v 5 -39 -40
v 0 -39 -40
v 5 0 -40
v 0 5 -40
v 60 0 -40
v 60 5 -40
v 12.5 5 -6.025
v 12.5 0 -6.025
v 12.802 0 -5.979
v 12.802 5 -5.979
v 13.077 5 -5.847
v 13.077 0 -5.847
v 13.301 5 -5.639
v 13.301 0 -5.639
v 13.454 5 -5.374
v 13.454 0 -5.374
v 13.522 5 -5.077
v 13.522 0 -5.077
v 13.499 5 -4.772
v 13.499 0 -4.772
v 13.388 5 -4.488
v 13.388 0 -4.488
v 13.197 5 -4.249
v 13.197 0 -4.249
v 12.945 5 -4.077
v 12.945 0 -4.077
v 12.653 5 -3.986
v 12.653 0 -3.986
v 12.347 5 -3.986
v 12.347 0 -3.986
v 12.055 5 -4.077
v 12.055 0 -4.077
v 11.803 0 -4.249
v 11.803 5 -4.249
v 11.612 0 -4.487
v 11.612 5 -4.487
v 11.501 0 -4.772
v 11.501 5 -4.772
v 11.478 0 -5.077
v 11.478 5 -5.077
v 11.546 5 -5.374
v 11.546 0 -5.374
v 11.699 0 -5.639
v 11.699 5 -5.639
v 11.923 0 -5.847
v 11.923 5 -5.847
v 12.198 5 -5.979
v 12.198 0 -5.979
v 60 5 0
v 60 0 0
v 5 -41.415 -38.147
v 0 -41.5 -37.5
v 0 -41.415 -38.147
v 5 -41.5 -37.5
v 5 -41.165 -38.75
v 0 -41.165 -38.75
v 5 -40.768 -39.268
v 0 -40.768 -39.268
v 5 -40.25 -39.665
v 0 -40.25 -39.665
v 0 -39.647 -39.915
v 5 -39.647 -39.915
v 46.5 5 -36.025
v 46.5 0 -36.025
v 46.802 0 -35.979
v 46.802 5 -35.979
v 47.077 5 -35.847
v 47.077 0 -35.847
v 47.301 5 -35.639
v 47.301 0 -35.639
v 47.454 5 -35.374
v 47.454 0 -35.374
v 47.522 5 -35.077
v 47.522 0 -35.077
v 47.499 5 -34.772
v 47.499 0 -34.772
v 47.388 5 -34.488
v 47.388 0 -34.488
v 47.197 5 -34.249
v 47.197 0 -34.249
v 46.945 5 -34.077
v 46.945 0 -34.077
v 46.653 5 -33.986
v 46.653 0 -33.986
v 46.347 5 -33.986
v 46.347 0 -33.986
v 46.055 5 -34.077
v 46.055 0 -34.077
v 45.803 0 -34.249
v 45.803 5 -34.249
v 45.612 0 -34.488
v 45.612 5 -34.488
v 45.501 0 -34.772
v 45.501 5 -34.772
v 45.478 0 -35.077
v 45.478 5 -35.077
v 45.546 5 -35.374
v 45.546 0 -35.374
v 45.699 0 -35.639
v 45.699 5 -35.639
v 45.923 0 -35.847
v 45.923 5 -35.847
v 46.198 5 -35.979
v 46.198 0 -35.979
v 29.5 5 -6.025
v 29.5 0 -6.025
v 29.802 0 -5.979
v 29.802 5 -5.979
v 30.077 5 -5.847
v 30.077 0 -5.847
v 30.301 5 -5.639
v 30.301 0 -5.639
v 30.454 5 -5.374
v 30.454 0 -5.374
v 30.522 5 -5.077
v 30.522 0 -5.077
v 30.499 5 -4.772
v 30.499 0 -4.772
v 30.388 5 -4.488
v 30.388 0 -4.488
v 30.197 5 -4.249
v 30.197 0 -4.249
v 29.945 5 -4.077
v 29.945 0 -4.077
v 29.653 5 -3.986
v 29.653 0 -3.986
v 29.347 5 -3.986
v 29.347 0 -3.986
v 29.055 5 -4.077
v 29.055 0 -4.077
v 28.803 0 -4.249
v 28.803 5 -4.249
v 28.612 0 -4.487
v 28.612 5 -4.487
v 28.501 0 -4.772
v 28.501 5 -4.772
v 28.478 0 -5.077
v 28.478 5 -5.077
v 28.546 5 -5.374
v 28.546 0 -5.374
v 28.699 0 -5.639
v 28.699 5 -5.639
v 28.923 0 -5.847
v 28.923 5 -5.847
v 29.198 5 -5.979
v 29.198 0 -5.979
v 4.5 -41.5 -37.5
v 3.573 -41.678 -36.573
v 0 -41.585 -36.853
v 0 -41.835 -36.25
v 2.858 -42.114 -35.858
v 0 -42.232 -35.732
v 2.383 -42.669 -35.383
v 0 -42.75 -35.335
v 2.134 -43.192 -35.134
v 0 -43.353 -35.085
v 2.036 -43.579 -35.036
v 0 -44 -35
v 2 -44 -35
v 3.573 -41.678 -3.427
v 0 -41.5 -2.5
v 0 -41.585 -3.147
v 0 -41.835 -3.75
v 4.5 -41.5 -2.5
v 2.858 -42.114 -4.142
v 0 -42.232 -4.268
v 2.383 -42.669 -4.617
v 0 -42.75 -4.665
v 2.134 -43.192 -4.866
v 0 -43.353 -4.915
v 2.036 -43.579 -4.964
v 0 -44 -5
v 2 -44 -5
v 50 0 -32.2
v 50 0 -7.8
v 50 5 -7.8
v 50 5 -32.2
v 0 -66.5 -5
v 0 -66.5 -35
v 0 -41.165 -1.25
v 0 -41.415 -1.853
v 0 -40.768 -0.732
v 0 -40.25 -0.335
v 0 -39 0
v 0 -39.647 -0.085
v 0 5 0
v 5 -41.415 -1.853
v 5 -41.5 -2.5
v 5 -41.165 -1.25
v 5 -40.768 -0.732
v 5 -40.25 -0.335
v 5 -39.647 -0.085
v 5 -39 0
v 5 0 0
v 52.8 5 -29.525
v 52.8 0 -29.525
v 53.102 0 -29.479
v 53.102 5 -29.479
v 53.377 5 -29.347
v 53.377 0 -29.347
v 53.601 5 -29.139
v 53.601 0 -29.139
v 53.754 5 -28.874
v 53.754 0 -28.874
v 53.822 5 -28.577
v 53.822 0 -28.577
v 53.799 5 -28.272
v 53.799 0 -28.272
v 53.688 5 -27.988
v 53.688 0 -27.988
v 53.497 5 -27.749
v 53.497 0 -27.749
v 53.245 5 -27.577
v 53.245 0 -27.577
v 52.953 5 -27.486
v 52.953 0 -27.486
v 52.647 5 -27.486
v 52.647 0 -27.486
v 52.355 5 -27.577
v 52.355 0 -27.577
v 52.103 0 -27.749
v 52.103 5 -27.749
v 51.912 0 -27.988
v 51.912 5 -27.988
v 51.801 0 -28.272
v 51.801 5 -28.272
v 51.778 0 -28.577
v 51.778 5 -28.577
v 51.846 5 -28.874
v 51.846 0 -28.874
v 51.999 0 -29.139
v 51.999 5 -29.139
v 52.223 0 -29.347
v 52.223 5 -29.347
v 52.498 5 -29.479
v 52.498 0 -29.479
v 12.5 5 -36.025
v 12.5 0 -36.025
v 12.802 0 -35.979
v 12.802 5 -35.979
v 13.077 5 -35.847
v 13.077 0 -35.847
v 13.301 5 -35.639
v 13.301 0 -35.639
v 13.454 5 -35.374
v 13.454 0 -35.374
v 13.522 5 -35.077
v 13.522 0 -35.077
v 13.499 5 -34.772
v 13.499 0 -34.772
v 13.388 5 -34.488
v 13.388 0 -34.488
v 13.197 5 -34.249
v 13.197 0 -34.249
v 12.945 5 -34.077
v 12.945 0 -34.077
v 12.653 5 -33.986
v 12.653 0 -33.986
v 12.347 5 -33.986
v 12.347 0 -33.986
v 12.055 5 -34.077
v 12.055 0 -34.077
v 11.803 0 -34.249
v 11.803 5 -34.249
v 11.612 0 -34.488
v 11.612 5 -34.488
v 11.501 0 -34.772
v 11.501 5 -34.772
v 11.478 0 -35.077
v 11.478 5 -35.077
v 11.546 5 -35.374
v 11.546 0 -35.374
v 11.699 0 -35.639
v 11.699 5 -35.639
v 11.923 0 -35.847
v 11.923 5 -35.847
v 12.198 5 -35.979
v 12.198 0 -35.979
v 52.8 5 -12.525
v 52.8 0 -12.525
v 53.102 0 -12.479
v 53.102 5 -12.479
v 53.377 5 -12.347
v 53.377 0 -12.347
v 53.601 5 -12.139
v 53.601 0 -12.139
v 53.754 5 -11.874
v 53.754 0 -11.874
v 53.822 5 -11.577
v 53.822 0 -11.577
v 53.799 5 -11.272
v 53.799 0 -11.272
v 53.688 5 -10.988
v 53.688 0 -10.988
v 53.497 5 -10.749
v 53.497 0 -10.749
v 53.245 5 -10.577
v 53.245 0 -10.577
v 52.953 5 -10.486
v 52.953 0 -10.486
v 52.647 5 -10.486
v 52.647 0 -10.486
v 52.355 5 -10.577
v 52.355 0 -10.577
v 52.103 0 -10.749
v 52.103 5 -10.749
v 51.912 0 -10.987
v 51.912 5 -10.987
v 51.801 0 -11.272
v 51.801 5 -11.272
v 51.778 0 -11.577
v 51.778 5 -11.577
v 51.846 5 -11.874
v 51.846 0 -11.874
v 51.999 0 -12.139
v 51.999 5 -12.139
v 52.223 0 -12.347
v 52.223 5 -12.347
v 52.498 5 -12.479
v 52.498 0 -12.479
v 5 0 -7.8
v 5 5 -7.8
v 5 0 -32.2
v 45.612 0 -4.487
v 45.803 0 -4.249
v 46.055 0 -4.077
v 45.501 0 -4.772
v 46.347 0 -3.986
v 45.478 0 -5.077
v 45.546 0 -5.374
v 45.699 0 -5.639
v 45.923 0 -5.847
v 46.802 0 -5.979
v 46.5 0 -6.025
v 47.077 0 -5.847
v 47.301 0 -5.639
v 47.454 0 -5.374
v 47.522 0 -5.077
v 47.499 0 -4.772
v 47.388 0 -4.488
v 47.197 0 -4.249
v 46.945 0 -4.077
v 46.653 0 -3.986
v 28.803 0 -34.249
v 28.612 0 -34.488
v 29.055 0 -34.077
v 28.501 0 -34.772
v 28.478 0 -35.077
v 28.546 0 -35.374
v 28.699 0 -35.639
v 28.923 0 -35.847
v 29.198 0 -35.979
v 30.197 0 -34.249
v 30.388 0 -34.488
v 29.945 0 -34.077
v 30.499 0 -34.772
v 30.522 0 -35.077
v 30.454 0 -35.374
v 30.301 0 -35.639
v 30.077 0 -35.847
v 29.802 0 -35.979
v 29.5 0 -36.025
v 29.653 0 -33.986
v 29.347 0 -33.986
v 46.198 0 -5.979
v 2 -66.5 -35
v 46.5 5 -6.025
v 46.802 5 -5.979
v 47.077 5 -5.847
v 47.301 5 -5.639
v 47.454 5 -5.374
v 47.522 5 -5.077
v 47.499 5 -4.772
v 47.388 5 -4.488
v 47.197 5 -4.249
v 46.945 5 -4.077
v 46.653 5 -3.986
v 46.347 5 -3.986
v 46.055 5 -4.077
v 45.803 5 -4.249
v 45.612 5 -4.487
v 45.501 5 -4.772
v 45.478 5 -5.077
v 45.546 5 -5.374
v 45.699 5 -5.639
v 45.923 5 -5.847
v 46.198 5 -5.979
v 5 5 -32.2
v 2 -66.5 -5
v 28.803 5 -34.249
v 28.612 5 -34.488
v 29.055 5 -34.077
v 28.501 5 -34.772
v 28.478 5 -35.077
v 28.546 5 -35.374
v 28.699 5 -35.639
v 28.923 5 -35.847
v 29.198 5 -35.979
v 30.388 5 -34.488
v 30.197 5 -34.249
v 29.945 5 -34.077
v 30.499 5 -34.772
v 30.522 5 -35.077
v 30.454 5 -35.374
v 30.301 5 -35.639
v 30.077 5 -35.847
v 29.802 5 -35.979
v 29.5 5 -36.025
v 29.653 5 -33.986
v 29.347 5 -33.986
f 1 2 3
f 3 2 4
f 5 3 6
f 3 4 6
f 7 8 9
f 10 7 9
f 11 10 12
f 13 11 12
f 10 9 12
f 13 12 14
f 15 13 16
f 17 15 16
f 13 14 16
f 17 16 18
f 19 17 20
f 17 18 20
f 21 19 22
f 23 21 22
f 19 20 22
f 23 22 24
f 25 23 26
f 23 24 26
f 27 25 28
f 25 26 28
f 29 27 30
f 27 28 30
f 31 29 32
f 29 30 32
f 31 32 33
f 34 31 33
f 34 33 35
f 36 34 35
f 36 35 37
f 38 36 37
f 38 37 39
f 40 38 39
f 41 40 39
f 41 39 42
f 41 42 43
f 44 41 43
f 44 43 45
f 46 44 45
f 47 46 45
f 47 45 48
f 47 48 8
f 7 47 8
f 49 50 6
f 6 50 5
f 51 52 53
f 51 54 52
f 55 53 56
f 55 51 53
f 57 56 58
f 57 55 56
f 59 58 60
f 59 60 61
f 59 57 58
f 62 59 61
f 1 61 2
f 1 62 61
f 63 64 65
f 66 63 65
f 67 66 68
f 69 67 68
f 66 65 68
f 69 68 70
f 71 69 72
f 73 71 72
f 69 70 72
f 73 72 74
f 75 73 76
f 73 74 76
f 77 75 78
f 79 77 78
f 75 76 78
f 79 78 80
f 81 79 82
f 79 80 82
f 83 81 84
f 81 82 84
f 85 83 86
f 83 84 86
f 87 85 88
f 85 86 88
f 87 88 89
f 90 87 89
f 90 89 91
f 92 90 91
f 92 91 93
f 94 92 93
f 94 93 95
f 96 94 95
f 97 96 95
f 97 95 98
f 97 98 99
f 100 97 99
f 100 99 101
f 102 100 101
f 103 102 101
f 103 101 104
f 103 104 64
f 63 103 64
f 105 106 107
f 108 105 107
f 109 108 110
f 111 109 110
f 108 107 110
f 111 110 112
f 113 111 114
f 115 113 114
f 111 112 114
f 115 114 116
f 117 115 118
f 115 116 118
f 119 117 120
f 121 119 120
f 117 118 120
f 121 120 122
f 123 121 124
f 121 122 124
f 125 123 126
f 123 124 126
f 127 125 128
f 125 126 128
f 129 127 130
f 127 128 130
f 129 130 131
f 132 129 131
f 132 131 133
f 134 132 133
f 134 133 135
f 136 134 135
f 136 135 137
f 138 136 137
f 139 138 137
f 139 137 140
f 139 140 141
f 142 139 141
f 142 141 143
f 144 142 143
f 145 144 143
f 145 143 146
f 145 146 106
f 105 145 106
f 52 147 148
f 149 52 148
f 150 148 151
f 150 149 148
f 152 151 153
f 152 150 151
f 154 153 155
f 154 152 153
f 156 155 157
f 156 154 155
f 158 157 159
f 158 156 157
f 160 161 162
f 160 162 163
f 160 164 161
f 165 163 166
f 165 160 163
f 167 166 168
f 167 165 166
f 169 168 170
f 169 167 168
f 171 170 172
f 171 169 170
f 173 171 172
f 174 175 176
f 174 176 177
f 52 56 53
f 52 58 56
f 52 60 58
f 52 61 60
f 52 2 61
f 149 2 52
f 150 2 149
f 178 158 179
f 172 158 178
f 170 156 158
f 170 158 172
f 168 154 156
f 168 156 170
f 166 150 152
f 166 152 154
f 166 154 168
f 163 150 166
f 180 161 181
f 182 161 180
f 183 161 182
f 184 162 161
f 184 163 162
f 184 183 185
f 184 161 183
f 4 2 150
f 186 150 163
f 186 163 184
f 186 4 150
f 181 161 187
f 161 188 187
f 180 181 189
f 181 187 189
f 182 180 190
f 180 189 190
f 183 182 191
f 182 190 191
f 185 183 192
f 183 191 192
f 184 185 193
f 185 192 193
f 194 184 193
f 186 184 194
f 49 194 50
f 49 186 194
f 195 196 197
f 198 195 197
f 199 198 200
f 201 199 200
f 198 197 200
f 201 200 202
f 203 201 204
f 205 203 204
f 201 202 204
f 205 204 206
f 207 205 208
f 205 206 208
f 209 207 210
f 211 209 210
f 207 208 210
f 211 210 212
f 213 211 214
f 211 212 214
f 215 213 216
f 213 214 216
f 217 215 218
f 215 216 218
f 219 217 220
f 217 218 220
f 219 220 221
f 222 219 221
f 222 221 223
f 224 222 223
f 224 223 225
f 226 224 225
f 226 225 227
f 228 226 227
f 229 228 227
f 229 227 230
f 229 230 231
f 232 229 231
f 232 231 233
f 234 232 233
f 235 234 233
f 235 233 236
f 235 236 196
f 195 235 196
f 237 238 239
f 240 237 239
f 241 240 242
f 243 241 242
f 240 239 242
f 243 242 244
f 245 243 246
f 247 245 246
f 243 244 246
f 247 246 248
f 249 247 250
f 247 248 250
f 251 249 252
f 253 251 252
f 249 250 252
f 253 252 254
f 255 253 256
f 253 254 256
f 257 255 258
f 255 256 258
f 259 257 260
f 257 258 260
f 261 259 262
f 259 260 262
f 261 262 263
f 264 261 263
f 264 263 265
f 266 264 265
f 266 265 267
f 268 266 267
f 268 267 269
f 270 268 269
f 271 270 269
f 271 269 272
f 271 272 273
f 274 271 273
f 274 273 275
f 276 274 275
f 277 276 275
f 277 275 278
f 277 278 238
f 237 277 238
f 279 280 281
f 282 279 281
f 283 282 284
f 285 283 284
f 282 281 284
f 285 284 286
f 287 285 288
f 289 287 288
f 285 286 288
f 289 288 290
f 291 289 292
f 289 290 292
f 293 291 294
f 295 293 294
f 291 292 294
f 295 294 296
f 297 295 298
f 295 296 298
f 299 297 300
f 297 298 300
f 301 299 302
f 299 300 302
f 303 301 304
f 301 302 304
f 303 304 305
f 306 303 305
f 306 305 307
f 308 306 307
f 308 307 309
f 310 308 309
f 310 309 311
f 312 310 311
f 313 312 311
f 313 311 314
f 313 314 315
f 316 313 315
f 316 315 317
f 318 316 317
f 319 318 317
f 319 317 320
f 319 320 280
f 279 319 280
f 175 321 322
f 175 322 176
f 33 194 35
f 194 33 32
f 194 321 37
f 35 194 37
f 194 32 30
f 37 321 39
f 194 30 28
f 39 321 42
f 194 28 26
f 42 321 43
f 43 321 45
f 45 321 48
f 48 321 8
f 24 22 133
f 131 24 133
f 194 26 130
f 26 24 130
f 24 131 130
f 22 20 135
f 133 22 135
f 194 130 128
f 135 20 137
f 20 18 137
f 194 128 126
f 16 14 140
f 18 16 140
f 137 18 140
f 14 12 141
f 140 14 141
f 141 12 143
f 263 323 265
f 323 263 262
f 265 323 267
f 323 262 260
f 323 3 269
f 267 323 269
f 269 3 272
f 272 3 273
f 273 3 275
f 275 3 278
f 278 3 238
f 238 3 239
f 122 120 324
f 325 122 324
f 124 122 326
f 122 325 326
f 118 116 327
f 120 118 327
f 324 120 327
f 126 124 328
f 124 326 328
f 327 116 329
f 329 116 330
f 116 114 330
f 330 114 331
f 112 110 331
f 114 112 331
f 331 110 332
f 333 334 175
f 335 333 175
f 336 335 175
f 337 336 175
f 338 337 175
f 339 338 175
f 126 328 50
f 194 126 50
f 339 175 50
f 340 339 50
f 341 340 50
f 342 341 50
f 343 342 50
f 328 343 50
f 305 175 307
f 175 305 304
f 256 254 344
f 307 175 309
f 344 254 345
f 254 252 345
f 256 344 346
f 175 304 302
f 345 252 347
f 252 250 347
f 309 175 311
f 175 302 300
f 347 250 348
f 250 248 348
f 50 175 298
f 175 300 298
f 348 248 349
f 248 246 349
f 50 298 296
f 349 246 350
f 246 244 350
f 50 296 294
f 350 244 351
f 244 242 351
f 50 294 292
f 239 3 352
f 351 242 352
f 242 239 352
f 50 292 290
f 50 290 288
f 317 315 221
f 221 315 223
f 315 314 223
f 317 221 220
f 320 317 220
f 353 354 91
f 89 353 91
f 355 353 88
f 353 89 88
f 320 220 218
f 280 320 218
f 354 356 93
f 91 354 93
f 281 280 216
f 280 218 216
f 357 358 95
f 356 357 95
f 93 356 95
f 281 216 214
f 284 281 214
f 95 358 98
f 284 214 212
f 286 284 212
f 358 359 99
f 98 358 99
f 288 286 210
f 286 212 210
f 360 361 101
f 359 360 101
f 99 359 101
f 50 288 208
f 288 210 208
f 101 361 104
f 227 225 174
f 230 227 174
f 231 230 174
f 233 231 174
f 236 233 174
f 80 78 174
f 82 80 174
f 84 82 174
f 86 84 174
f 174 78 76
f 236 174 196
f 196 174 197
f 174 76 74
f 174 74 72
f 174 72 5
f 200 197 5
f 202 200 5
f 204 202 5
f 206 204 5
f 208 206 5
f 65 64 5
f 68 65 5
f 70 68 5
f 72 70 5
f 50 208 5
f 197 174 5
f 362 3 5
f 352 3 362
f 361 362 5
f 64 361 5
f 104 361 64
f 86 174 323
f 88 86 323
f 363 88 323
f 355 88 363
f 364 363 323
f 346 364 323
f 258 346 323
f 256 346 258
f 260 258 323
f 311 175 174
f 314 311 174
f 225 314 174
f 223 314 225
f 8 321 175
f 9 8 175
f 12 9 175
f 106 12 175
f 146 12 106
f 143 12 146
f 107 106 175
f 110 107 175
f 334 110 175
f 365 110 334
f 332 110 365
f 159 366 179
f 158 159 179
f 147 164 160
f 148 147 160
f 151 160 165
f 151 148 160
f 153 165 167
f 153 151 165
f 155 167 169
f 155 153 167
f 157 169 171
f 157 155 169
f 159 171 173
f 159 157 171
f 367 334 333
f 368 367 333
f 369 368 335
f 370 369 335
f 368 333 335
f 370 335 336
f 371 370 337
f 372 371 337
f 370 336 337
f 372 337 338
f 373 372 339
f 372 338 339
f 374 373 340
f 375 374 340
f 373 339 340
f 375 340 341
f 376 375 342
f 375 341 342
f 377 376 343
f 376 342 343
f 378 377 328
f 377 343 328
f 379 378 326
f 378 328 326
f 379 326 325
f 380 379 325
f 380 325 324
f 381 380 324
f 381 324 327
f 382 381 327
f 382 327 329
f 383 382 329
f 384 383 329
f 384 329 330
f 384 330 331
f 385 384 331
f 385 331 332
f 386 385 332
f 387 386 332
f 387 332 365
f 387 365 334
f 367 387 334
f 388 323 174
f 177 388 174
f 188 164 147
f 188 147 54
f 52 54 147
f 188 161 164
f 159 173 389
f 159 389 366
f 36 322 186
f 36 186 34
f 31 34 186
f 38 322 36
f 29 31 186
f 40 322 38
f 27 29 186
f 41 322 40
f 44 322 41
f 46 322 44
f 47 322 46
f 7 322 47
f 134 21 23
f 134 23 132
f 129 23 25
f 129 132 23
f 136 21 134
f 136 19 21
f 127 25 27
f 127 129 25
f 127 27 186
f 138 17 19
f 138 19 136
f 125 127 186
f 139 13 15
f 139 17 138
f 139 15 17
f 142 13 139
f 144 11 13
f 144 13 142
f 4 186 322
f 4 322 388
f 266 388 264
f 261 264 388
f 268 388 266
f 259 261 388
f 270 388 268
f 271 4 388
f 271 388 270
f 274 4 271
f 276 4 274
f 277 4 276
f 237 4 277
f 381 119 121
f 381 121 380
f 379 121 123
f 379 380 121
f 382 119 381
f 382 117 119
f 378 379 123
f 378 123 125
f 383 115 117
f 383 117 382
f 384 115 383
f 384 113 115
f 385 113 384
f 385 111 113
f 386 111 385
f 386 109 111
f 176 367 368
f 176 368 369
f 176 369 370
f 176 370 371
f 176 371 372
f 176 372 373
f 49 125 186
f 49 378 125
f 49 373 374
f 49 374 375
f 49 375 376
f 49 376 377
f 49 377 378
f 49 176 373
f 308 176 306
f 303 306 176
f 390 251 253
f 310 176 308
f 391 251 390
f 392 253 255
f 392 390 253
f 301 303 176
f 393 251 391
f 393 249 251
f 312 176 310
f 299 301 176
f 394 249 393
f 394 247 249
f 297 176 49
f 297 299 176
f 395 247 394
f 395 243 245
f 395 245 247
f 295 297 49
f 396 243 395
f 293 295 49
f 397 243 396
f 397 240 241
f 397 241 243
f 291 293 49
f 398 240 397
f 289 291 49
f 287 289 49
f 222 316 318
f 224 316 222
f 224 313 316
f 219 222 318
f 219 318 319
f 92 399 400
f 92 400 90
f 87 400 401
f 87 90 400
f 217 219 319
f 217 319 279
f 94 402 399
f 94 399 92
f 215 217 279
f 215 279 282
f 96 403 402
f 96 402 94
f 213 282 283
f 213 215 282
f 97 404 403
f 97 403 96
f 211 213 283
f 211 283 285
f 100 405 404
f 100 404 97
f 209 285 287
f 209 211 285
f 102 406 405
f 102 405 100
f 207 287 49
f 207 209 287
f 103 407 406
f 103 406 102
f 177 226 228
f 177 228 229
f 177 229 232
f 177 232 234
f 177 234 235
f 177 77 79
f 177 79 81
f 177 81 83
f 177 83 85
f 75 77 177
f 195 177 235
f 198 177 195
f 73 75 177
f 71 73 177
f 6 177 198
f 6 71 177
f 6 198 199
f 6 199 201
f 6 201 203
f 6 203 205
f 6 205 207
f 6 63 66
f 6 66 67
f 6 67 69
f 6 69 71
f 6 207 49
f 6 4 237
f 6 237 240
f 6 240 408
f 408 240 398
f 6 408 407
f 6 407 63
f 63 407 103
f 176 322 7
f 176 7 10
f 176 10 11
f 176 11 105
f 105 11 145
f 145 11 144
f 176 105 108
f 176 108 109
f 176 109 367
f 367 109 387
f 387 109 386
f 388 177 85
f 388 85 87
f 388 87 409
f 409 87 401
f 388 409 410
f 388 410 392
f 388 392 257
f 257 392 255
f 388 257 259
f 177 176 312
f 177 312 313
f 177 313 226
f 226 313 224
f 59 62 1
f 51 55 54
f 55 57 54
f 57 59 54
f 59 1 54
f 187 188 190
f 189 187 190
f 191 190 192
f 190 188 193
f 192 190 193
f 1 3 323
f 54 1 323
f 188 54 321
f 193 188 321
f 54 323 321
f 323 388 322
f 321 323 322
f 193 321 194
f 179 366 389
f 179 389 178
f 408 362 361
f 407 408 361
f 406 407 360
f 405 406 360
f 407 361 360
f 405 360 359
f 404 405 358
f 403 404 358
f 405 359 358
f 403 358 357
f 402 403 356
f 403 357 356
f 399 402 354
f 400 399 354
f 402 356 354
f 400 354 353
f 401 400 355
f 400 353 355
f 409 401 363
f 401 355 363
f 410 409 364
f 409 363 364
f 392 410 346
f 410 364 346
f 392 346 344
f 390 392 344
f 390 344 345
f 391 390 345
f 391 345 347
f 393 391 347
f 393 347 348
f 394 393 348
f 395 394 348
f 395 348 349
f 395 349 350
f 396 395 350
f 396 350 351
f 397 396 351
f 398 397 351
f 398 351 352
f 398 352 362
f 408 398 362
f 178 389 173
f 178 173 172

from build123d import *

# Parameters (mm, degrees)
SKETCH1_W           = 60
SKETCH1_H           = 40
SKETCH1_W_2         = 45
SKETCH1_H_2         = 24.4
BOSS_EXTRUDE1_DEPTH = 5
SKETCH6_W           = 5
SKETCH6_H           = 40
BOSS_EXTRUDE4_DEPTH = 41.5
SKETCH7_W           = 2
SKETCH7_H           = 30
BOSS_EXTRUDE5_DEPTH = 25
FILLET2_R           = 2.5
FILLET3_R           = 2.5
CUT_EXTRUDE1_REACH  = 100.093
SKETCH8_R           = 1.025


with BuildPart() as part:
    # Sketch1 → Boss-Extrude1 (new body)
    with BuildSketch(Plane(origin=(0, 0, 0), x_dir=(1, 0, 0), z_dir=(0, 1, 0))):
        with Locations((30, 20)):
            Rectangle(SKETCH1_W, SKETCH1_H)
        with Locations((27.5, 20)):
            Rectangle(SKETCH1_W_2, SKETCH1_H_2, mode=Mode.SUBTRACT)
    extrude(amount=BOSS_EXTRUDE1_DEPTH)

    # Sketch6 → Boss-Extrude4 (add)
    with BuildSketch(Plane.XZ):
        with Locations((2.5, -20)):
            Rectangle(SKETCH6_W, SKETCH6_H)
    extrude(amount=BOSS_EXTRUDE4_DEPTH)

    # Sketch7 → Boss-Extrude5 (add)
    with BuildSketch(Plane(origin=(0, -41.5, 0), x_dir=(-1, 0, 0), z_dir=(0, -1, 0))):
        with Locations((-1, 20)):
            Rectangle(SKETCH7_W, SKETCH7_H)
    extrude(amount=BOSS_EXTRUDE5_DEPTH)

    # Fillet2
    fillet2_edges = [part.edges().sort_by_distance(p)[0] for p in [
        (2, -41.5, -20),
    ]]
    fillet(fillet2_edges, radius=FILLET2_R)

    # Fillet3
    fillet3_edges = [part.edges().sort_by_distance(p)[0] for p in [
        (2.25, -41.5, -5),
        (2.25, -41.5, -35),
        (2.5, -41.5, 0),
        (2.5, -41.5, -40),
    ]]
    fillet(fillet3_edges, radius=FILLET3_R - 0.0001)  # a hair under: the kernel refuses the full size

    # Sketch8 → Cut-Extrude1 (cut, up to next)
    with BuildSketch(Plane(origin=(0, 0, 0), x_dir=(-1, 0, 0), z_dir=(0, -1, 0)), mode=Mode.PRIVATE) as cut_extrude1_sk1:
        with Locations(Location((-46.5, 5, 0), (0, 0, 90))):
            Circle(SKETCH8_R)
    cut_extrude1_tool1 = extrude(cut_extrude1_sk1.sketch, amount=-CUT_EXTRUDE1_REACH, mode=Mode.PRIVATE) & part.part
    # Sketch8 → Cut-Extrude1 (cut, up to next)
    with BuildSketch(Plane(origin=(0, 0, 0), x_dir=(-1, 0, 0), z_dir=(0, -1, 0)), mode=Mode.PRIVATE) as cut_extrude1_sk2:
        with Locations(Location((-29.5, 5, 0), (0, 0, 90))):
            Circle(SKETCH8_R)
    cut_extrude1_tool2 = extrude(cut_extrude1_sk2.sketch, amount=-CUT_EXTRUDE1_REACH, mode=Mode.PRIVATE) & part.part
    # Sketch8 → Cut-Extrude1 (cut, up to next)
    with BuildSketch(Plane(origin=(0, 0, 0), x_dir=(-1, 0, 0), z_dir=(0, -1, 0)), mode=Mode.PRIVATE) as cut_extrude1_sk3:
        with Locations(Location((-12.5, 5, 0), (0, 0, 90))):
            Circle(SKETCH8_R)
    cut_extrude1_tool3 = extrude(cut_extrude1_sk3.sketch, amount=-CUT_EXTRUDE1_REACH, mode=Mode.PRIVATE) & part.part
    # Sketch8 → Cut-Extrude1 (cut, up to next)
    with BuildSketch(Plane(origin=(0, 0, 0), x_dir=(-1, 0, 0), z_dir=(0, -1, 0)), mode=Mode.PRIVATE) as cut_extrude1_sk4:
        with Locations(Location((-52.8, 11.5, 0), (0, 0, 90))):
            Circle(SKETCH8_R)
    cut_extrude1_tool4 = extrude(cut_extrude1_sk4.sketch, amount=-CUT_EXTRUDE1_REACH, mode=Mode.PRIVATE) & part.part
    # Sketch8 → Cut-Extrude1 (cut, up to next)
    with BuildSketch(Plane(origin=(0, 0, 0), x_dir=(-1, 0, 0), z_dir=(0, -1, 0)), mode=Mode.PRIVATE) as cut_extrude1_sk5:
        with Locations(Location((-12.5, 35, 0), (0, 0, 90))):
            Circle(SKETCH8_R)
    cut_extrude1_tool5 = extrude(cut_extrude1_sk5.sketch, amount=-CUT_EXTRUDE1_REACH, mode=Mode.PRIVATE) & part.part
    # Sketch8 → Cut-Extrude1 (cut, up to next)
    with BuildSketch(Plane(origin=(0, 0, 0), x_dir=(-1, 0, 0), z_dir=(0, -1, 0)), mode=Mode.PRIVATE) as cut_extrude1_sk6:
        with Locations(Location((-29.5, 35, 0), (0, 0, 90))):
            Circle(SKETCH8_R)
    cut_extrude1_tool6 = extrude(cut_extrude1_sk6.sketch, amount=-CUT_EXTRUDE1_REACH, mode=Mode.PRIVATE) & part.part
    # Sketch8 → Cut-Extrude1 (cut, up to next)
    with BuildSketch(Plane(origin=(0, 0, 0), x_dir=(-1, 0, 0), z_dir=(0, -1, 0)), mode=Mode.PRIVATE) as cut_extrude1_sk7:
        with Locations(Location((-46.5, 35, 0), (0, 0, 90))):
            Circle(SKETCH8_R)
    cut_extrude1_tool7 = extrude(cut_extrude1_sk7.sketch, amount=-CUT_EXTRUDE1_REACH, mode=Mode.PRIVATE) & part.part
    # Sketch8 → Cut-Extrude1 (cut, up to next)
    with BuildSketch(Plane(origin=(0, 0, 0), x_dir=(-1, 0, 0), z_dir=(0, -1, 0)), mode=Mode.PRIVATE) as cut_extrude1_sk8:
        with Locations(Location((-52.8, 28.5, 0), (0, 0, 90))):
            Circle(SKETCH8_R)
    cut_extrude1_tool8 = extrude(cut_extrude1_sk8.sketch, amount=-CUT_EXTRUDE1_REACH, mode=Mode.PRIVATE) & part.part
    add(cut_extrude1_tool1.solids().sort_by_distance((46.5, 0, -5))[0], mode=Mode.SUBTRACT)
    add(cut_extrude1_tool2.solids().sort_by_distance((29.5, 0, -5))[0], mode=Mode.SUBTRACT)
    add(cut_extrude1_tool3.solids().sort_by_distance((12.5, 0, -5))[0], mode=Mode.SUBTRACT)
    add(cut_extrude1_tool4.solids().sort_by_distance((52.8, 0, -11.5))[0], mode=Mode.SUBTRACT)
    add(cut_extrude1_tool5.solids().sort_by_distance((12.5, 0, -35))[0], mode=Mode.SUBTRACT)
    add(cut_extrude1_tool6.solids().sort_by_distance((29.5, 0, -35))[0], mode=Mode.SUBTRACT)
    add(cut_extrude1_tool7.solids().sort_by_distance((46.5, 0, -35))[0], mode=Mode.SUBTRACT)
    add(cut_extrude1_tool8.solids().sort_by_distance((52.8, 0, -28.5))[0], mode=Mode.SUBTRACT)


solid = part.part
